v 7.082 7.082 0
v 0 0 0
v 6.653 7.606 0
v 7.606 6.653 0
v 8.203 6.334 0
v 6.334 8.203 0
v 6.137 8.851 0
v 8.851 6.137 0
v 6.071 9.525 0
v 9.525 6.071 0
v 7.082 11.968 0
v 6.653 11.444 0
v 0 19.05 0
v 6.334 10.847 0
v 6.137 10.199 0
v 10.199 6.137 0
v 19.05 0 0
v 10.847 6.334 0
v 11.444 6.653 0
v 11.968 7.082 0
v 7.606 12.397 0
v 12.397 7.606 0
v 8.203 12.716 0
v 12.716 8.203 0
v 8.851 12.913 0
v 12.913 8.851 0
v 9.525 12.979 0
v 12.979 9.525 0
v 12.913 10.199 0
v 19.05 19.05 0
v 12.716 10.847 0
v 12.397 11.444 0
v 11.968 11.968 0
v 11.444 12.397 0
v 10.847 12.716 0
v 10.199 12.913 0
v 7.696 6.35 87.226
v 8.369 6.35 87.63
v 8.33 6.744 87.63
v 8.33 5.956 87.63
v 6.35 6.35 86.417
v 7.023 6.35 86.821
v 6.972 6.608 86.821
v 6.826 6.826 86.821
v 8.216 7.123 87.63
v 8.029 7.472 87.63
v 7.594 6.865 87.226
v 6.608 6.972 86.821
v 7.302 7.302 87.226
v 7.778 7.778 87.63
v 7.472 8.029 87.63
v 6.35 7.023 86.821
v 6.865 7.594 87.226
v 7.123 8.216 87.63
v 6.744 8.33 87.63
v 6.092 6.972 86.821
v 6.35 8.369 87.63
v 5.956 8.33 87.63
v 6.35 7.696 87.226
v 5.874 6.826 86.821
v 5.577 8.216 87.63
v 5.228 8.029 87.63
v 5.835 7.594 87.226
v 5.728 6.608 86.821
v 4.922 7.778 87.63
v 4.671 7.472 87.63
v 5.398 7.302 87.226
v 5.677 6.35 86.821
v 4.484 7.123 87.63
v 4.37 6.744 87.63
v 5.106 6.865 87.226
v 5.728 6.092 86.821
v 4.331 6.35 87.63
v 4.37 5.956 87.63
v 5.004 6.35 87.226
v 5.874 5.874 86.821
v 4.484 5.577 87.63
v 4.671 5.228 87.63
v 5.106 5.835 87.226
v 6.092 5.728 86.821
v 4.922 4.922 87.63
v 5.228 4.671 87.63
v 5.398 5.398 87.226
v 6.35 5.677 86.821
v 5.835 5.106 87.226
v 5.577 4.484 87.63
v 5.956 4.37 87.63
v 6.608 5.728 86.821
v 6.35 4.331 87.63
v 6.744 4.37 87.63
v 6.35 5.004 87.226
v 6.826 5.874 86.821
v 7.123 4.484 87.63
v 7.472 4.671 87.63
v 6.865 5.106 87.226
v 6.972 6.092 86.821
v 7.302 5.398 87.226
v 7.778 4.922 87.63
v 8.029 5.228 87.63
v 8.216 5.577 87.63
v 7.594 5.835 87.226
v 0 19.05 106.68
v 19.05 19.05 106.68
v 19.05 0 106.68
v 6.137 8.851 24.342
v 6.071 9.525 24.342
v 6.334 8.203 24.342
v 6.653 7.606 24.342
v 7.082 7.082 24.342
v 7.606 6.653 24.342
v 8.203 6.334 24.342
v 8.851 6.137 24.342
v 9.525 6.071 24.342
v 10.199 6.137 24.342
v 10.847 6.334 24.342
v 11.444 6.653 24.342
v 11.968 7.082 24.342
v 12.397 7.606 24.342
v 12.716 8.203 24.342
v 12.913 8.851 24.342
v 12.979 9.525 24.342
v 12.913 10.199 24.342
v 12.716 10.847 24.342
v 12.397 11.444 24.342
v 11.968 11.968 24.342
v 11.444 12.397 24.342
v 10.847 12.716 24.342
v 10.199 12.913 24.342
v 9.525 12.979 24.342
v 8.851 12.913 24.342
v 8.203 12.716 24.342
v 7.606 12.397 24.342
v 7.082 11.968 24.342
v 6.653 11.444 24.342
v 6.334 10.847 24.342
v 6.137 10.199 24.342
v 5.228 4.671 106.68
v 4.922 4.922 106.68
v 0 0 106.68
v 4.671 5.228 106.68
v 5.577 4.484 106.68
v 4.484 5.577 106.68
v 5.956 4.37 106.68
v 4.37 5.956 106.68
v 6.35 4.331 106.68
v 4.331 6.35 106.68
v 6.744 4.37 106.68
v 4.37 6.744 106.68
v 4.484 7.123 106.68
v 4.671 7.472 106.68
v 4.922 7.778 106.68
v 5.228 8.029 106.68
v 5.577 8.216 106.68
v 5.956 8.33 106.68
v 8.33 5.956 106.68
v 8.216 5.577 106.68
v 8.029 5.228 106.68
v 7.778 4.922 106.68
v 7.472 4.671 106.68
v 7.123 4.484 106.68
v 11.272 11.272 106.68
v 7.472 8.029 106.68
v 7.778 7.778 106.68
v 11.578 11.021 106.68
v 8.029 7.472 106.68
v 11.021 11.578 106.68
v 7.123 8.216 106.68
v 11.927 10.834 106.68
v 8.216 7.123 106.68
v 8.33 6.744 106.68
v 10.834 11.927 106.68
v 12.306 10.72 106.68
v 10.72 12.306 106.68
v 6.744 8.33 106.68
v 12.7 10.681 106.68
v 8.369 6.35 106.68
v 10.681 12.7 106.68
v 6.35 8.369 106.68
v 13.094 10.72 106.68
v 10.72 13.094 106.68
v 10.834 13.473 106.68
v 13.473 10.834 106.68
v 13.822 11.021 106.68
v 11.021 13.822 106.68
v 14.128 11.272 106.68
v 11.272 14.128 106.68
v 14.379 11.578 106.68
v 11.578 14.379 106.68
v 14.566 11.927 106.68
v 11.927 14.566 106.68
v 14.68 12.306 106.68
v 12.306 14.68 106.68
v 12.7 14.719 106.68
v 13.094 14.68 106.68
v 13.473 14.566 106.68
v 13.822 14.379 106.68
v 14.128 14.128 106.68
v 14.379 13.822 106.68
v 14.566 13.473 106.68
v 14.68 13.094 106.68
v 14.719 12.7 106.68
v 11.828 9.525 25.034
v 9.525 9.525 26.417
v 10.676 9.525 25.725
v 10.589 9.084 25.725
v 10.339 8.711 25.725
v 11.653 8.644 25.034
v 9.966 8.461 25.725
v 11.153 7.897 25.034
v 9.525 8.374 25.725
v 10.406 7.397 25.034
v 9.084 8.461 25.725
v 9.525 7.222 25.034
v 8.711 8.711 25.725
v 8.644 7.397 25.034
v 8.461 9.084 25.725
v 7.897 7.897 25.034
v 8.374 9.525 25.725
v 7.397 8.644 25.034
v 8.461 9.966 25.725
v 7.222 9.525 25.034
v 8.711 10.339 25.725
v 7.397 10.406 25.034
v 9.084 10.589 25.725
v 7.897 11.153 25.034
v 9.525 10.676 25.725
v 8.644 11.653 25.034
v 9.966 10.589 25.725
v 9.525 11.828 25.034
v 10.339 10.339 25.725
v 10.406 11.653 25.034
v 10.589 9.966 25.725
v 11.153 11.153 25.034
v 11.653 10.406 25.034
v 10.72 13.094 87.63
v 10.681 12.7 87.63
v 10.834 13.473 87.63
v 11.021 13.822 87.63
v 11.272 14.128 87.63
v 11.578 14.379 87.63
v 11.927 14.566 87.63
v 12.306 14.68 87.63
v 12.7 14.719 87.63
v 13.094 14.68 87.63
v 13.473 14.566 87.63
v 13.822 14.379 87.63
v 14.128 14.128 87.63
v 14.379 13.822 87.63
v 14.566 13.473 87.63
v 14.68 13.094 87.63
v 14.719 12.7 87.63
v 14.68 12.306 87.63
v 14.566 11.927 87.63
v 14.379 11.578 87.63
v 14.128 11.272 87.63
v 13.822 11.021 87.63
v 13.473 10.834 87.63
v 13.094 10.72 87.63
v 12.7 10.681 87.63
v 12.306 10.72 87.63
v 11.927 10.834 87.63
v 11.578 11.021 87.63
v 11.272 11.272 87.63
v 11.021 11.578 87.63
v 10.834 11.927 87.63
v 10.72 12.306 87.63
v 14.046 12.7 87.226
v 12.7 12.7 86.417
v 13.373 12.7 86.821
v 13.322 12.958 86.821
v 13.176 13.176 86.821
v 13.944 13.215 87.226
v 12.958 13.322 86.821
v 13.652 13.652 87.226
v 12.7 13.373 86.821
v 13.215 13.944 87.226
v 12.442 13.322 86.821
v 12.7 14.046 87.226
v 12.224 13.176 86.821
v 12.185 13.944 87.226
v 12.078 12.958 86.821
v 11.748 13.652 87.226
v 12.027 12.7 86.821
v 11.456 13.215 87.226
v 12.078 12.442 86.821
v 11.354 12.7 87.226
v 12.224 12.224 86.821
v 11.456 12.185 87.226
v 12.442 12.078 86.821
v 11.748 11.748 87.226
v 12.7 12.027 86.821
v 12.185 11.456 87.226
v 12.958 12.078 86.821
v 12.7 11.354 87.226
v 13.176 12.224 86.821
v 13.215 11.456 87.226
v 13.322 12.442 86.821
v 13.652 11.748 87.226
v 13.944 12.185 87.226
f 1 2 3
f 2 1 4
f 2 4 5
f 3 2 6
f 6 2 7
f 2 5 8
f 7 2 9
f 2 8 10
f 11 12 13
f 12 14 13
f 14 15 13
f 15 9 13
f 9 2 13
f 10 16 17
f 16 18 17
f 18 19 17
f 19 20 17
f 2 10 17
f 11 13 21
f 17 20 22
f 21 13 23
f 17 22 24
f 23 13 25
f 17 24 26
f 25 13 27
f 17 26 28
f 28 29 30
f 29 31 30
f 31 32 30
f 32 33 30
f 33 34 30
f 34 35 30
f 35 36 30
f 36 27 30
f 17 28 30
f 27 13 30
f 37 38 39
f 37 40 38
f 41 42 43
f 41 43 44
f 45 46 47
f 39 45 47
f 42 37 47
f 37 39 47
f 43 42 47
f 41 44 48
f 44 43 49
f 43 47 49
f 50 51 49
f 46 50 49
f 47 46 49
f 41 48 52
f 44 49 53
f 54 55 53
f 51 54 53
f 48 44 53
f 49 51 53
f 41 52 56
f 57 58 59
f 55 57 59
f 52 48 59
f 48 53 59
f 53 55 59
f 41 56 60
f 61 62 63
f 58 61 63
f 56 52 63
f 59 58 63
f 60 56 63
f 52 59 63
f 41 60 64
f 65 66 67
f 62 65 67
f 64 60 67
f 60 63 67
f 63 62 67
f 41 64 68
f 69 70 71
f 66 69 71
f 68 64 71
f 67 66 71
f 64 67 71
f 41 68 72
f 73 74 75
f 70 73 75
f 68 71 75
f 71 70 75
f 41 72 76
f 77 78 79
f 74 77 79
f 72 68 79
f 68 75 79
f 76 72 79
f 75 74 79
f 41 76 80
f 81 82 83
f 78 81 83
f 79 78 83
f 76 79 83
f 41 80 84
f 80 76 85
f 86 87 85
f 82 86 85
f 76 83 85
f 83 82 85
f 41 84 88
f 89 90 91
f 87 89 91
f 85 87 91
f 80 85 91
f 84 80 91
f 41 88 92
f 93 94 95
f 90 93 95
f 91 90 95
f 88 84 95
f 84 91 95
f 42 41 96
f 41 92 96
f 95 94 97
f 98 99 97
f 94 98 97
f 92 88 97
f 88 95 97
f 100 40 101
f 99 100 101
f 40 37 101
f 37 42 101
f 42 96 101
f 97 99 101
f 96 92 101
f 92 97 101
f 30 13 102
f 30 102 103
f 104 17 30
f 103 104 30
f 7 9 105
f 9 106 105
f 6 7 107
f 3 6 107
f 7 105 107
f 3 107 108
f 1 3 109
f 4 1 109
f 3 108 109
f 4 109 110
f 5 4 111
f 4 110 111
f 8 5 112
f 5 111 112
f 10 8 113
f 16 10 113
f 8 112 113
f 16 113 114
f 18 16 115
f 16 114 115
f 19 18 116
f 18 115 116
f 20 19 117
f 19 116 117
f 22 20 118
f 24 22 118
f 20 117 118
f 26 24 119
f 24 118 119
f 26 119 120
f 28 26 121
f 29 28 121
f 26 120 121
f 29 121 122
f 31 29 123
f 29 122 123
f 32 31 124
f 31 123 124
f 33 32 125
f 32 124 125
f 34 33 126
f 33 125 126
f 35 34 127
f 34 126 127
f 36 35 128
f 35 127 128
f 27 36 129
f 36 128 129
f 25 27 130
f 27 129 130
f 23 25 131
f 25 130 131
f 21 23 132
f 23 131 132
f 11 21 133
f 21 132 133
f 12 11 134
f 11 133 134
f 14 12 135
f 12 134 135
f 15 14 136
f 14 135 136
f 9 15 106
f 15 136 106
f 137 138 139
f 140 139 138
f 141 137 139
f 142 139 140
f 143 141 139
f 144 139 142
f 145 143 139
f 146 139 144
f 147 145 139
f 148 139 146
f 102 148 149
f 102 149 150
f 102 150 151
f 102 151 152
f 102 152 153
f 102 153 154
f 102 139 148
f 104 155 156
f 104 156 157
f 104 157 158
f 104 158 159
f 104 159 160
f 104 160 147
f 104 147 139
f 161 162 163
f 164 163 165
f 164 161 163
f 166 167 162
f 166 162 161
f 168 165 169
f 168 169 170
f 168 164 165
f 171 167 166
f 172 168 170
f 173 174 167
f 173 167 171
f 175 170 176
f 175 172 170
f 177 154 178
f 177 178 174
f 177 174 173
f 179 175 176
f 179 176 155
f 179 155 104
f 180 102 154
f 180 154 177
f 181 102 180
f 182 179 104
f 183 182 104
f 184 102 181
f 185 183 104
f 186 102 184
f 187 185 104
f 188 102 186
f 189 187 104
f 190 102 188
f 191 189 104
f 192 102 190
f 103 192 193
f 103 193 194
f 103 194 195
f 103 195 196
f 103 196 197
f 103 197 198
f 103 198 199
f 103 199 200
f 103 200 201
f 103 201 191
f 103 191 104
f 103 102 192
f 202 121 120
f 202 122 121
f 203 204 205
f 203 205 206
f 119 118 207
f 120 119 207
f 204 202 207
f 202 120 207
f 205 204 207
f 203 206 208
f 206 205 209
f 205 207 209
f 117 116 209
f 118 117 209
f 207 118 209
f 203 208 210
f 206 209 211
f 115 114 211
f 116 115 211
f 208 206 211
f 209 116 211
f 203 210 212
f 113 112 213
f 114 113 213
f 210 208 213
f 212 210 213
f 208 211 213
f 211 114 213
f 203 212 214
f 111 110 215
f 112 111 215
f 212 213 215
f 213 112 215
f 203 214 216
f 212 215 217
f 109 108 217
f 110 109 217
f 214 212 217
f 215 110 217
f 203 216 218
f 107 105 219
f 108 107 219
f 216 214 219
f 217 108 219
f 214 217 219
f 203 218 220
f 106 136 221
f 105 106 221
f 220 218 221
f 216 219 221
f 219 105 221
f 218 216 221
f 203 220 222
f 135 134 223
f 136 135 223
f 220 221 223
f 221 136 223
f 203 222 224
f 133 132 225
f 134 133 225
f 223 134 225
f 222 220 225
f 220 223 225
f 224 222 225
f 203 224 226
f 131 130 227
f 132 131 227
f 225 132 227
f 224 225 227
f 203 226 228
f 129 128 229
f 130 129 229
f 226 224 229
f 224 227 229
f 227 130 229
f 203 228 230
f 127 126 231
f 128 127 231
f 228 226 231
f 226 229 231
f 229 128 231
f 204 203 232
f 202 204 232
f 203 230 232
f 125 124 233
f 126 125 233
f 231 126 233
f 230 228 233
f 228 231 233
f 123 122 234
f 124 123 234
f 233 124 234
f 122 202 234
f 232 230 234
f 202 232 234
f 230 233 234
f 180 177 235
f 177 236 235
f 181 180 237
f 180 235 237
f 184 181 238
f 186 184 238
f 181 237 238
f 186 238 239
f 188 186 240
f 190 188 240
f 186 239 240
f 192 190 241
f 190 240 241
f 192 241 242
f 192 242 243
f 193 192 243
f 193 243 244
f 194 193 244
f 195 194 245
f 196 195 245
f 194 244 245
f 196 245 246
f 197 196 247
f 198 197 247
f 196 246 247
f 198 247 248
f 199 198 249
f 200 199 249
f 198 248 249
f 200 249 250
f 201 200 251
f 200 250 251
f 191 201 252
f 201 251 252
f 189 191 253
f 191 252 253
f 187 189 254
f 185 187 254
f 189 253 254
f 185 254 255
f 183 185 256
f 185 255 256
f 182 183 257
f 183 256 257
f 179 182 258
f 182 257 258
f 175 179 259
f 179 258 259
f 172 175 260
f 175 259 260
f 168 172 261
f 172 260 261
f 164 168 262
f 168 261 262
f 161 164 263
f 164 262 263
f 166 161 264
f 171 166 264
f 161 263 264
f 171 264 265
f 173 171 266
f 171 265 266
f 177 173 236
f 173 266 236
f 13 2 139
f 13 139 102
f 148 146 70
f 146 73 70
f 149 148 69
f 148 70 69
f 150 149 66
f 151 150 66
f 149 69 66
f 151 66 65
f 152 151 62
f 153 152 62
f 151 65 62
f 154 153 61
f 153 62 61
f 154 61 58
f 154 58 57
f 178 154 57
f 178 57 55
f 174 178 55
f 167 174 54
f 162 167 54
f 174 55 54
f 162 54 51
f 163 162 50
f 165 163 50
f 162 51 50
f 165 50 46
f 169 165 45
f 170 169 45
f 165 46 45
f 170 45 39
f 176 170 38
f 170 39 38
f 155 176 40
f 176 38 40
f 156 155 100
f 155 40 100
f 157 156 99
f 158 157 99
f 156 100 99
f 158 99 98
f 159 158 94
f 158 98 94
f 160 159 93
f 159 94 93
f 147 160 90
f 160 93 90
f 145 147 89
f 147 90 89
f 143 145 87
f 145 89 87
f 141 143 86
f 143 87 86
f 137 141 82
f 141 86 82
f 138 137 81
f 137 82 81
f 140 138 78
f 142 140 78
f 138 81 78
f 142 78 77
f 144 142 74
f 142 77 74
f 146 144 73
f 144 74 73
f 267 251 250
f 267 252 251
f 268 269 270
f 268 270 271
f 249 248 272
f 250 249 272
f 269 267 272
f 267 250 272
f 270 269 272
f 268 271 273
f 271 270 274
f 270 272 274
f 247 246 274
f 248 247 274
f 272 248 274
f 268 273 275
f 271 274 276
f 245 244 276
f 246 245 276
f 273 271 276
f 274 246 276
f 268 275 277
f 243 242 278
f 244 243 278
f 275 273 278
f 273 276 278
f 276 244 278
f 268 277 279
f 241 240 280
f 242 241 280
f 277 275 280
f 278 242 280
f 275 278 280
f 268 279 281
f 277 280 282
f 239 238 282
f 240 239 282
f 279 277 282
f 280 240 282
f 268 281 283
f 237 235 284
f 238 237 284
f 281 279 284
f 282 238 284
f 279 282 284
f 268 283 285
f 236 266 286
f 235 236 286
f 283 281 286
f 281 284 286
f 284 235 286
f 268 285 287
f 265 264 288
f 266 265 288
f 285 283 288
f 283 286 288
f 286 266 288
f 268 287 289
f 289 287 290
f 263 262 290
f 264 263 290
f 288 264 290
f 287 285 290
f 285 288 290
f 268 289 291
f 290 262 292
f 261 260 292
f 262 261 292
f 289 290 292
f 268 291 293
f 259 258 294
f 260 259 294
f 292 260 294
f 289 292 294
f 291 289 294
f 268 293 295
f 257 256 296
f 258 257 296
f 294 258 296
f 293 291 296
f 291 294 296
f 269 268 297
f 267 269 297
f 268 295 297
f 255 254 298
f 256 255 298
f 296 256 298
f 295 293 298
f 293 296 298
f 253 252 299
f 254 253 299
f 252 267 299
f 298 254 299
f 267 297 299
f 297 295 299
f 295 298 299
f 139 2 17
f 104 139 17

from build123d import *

# Parameters (mm, degrees)
F0_W     = 19.05
F0_H     = 19.05
F1_DEPTH = 106.68
F3_D     = 4.0386
F3_DEPTH = 19.05
F3_TIP   = 1.213317848
F5_D     = 6.9088
F5_DEPTH = 24.3416666667
F5_TIP   = 2.0756129224


with BuildPart() as f1:
    # F0 (on Top) → F1 (new body)
    with BuildSketch(Plane.XY):
        with Locations((9.525, 9.525)):
            Rectangle(F0_W, F0_H)
    extrude(amount=F1_DEPTH)

    # F3
    with Locations(Plane.XY.offset(106.68)):
        with Locations((12.7, 12.7), (6.35, 6.35)):
            Hole(F3_D / 2, depth=F3_DEPTH)
            with Locations((0, 0, -(F3_DEPTH + F3_TIP / 2))):  # 118° drill point
                Cone(0, F3_D / 2, F3_TIP, mode=Mode.SUBTRACT)

    # F5
    with Locations(Plane(origin=(0, 0, 0), x_dir=(1, 0, 0), z_dir=(0, 0, -1))):
        with Locations((9.525, -9.525)):
            Hole(F5_D / 2, depth=F5_DEPTH)
            with Locations((0, 0, -(F5_DEPTH + F5_TIP / 2))):  # 118° drill point
                Cone(0, F5_D / 2, F5_TIP, mode=Mode.SUBTRACT)


solid = f1.part
